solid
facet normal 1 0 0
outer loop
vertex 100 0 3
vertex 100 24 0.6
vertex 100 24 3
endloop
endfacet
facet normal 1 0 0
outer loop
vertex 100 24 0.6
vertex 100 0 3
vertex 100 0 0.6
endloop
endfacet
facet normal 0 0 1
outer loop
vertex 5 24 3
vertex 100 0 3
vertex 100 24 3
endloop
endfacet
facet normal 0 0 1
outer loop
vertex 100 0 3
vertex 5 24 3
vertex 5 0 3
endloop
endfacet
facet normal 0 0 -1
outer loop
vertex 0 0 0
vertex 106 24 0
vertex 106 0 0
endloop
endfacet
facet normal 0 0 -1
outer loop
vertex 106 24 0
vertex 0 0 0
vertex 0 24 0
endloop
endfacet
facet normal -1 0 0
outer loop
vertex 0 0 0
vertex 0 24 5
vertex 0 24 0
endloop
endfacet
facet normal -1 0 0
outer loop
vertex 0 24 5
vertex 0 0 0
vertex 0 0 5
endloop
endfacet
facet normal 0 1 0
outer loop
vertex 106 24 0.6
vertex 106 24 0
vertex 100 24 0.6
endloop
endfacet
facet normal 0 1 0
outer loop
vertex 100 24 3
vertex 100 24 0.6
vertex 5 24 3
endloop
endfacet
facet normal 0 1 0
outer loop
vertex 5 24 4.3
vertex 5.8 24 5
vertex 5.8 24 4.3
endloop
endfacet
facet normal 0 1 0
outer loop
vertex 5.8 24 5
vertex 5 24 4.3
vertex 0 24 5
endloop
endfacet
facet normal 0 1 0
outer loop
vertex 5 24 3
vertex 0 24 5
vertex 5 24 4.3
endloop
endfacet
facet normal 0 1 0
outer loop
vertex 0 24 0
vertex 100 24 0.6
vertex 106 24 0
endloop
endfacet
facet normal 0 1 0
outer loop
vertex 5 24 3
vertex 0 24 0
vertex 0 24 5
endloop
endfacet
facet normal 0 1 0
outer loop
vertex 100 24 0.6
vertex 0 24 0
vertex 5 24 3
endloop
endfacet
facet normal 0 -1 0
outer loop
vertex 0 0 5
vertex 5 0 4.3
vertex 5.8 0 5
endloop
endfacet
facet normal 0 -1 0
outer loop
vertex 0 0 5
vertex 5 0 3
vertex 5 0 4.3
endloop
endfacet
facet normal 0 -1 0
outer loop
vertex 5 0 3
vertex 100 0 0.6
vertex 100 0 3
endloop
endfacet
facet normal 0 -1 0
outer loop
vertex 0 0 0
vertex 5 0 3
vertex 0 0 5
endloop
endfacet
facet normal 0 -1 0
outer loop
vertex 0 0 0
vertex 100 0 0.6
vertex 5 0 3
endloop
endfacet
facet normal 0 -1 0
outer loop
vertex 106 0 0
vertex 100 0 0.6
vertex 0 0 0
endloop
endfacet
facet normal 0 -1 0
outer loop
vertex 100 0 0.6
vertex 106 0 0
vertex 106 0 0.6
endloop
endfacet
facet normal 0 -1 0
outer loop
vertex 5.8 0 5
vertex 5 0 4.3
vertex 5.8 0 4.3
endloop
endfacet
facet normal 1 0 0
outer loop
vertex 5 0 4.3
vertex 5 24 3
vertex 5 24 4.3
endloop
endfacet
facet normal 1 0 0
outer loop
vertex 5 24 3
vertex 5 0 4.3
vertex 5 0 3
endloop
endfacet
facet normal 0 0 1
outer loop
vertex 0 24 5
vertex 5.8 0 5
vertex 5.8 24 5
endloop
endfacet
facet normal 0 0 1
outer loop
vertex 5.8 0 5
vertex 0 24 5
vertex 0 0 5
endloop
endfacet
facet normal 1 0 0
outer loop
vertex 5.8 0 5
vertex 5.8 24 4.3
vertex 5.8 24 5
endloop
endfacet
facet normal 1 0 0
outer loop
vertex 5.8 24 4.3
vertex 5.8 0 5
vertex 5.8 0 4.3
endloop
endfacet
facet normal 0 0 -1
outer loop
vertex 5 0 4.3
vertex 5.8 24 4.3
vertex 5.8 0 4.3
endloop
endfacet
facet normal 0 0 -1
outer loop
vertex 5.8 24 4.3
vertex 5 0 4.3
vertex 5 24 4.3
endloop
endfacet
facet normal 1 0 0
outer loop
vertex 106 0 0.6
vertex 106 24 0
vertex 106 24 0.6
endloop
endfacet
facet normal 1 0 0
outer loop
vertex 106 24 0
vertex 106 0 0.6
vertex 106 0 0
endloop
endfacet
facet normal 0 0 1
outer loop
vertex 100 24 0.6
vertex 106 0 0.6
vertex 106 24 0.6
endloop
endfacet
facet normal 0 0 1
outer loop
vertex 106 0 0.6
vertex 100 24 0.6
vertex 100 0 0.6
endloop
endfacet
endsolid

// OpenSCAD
/* Bag clip with living hinge - PETG, 0.4mm nozzle, no supports
   Printed open flat (single print, fuses into one piece), folds shut on 2mm folded bag.
   Two verification parts (lower + upper) that fuse at hinge when printed together.
   Assembly shows closed on bag, motion "closing" folds upper onto lower/bag.
*/
/* [Print] */
part = "lower"; // [lower, upper, assembly]

cadverify_only = "";
module instance(name, part, unit = 1) {
    echo(cadverify_instance = [name, part, unit]);
    if (cadverify_only == "" || cadverify_only == name) children();
}

// ---- parameters (mm) ----
arm_len = 100;
arm_w = 24;
arm_t = 3;
hinge_len = 6;
hinge_t = 0.6;
tab_len = 12;
heel_len = 8;
catch_w = 5;
lip = 0.8;
lip_t = 0.7;
bag_t = 2;

lower_xmax = 106;      // 0..106
upper_len_print = 112; // 0..112
closed_h = 8.2;
pivot_x = 103.05;
pivot_z = 4.1;

module lower_geo() {
    // base
    cube([100, arm_w, arm_t]);
    // catch block at free end (x 0..5), overlap into base
    translate([0, 0, 2.98]) cube([5, arm_w, 2.02]);
    // catch lip protruding +x, overlap into block
    translate([4.98, 0, 4.3]) cube([0.82, arm_w, 0.7]);
    // living hinge leaf, overlap into base
    translate([99.98, 0, 0]) cube([6.02, arm_w, hinge_t]);
}

module upper_geo() {
    // base 0..100
    cube([100, arm_w, arm_t]);
    // heel at hinge end on top
    translate([0, 0, 2.98]) cube([8, arm_w, 2.02]);
    // hook leg near free end on top
    translate([92.2, 0, 2.98]) cube([2, arm_w, 1.82]);
    // hook lip protruding +x from leg side
    translate([94.18, 0, 4.1]) cube([0.82, arm_w, 0.7]);
    // thumb tab extension beyond free end
    translate([99.98, 0, 0]) cube([12.02, arm_w, arm_t]);
}

module bag_geo() {
    translate([8, 0, 3]) cube([84, arm_w, bag_t]);
}

if (part == "lower") {
    echo(cadverify_spec = [
        ["bounds", [[0, 0, 0], [106, 24, 5]]],
        ["bodies", 1],
        ["through_holes", 0],
        ["support_faces", [["bed", "-z", 500]]],
        ["overhangs_allowed", [["catch lip bridge", [[4.5, 0, 4.0], [6.2, 24, 5.1]]]]],
        ["copies", 1],
        ["details", [
            ["base", "material", [[10, 0, 0], [90, 24, 3]], 1],
            ["catch", "material", [[0, 0, 3], [5, 24, 5]], 1],
            ["catch_lip", "material", [[5.0, 0.1, 4.35], [5.75, 23.9, 4.95]], 0.9],
            ["hinge", "material", [[100.05, 0.1, 0.05], [105.95, 23.9, 0.55]], 0.9],
            ["hook_space", "void", [[5.8, 0, 3], [8.6, 24, 5.4]], 1],
            ["bag_space", "void", [[8, 0, 5.1], [92, 24, 7]], 1],
            ["wall", "thickness", [50, 12, 6], [0, 0, -1], 3],
            ["film", "thickness", [103, 12, 2], [0, 0, -1], 0.6],
            ["hinge_top", "view", [[99, 0, 0], [107, 24, 1]]]
        ]]
    ]);
    lower_geo();
} else if (part == "upper") {
    echo(cadverify_spec = [
        ["bounds", [[0, 0, 0], [112, 24, 5]]],
        ["bodies", 1],
        ["through_holes", 0],
        ["support_faces", [["bed", "-z", 500]]],
        ["overhangs_allowed", [["hook lip bridge", [[91.5, 0, 2.8], [96, 24, 5]]]]],
        ["copies", 1],
        ["details", [
            ["heel", "material", [[0, 0, 3], [8, 24, 5]], 1],
            ["arm", "material", [[10, 0, 0], [80, 24, 3]], 1],
            ["hook_leg", "material", [[92.3, 0.1, 3.05], [94.1, 23.9, 4.75]], 0.9],
            ["hook_lip", "material", [[94.2, 0.1, 4.15], [94.95, 23.9, 4.75]], 0.9],
            ["tab", "material", [[100, 0, 0], [112, 24, 3]], 1],
            ["catch_space", "void", [[95, 0, 3], [99.9, 24, 5]], 1],
            ["wall", "thickness", [50, 12, 6], [0, 0, -1], 3],
            ["heel_wall", "thickness", [4, 12, 7], [0, 0, -1], 5],
            ["thumb", "view", [[99, 0, 0], [113, 24, 3.5]]]
        ]]
    ]);
    upper_geo();
} else if (part == "assembly") {
    echo(cadverify_spec = [
        ["bounds", [[0, 0, 0], [218, 24, 5]]],
        ["support_faces", [["bed", "-z", 1000]]],
        ["motions", [
            ["closing", ["upper"], "rotate", [103, 12, 4], [0, -1, 0], [0, 180],
                ["flex", [["upper", "lower", 1, "latch snap and heel clearance"]]], ["stops", [180]], ["rests", [180]]]
        ]],
        ["assembly_order", [
            [["lower"], [0, 0, 0]],
            [["bag"], [0, 0, -1]],
            [["upper"], [0, 0, -1]]
        ]]
    ]);
    instance("lower", "lower") lower_geo();
    instance("upper", "upper") translate([106, 0, 0]) upper_geo();
    instance("bag", "external") bag_geo();
}
